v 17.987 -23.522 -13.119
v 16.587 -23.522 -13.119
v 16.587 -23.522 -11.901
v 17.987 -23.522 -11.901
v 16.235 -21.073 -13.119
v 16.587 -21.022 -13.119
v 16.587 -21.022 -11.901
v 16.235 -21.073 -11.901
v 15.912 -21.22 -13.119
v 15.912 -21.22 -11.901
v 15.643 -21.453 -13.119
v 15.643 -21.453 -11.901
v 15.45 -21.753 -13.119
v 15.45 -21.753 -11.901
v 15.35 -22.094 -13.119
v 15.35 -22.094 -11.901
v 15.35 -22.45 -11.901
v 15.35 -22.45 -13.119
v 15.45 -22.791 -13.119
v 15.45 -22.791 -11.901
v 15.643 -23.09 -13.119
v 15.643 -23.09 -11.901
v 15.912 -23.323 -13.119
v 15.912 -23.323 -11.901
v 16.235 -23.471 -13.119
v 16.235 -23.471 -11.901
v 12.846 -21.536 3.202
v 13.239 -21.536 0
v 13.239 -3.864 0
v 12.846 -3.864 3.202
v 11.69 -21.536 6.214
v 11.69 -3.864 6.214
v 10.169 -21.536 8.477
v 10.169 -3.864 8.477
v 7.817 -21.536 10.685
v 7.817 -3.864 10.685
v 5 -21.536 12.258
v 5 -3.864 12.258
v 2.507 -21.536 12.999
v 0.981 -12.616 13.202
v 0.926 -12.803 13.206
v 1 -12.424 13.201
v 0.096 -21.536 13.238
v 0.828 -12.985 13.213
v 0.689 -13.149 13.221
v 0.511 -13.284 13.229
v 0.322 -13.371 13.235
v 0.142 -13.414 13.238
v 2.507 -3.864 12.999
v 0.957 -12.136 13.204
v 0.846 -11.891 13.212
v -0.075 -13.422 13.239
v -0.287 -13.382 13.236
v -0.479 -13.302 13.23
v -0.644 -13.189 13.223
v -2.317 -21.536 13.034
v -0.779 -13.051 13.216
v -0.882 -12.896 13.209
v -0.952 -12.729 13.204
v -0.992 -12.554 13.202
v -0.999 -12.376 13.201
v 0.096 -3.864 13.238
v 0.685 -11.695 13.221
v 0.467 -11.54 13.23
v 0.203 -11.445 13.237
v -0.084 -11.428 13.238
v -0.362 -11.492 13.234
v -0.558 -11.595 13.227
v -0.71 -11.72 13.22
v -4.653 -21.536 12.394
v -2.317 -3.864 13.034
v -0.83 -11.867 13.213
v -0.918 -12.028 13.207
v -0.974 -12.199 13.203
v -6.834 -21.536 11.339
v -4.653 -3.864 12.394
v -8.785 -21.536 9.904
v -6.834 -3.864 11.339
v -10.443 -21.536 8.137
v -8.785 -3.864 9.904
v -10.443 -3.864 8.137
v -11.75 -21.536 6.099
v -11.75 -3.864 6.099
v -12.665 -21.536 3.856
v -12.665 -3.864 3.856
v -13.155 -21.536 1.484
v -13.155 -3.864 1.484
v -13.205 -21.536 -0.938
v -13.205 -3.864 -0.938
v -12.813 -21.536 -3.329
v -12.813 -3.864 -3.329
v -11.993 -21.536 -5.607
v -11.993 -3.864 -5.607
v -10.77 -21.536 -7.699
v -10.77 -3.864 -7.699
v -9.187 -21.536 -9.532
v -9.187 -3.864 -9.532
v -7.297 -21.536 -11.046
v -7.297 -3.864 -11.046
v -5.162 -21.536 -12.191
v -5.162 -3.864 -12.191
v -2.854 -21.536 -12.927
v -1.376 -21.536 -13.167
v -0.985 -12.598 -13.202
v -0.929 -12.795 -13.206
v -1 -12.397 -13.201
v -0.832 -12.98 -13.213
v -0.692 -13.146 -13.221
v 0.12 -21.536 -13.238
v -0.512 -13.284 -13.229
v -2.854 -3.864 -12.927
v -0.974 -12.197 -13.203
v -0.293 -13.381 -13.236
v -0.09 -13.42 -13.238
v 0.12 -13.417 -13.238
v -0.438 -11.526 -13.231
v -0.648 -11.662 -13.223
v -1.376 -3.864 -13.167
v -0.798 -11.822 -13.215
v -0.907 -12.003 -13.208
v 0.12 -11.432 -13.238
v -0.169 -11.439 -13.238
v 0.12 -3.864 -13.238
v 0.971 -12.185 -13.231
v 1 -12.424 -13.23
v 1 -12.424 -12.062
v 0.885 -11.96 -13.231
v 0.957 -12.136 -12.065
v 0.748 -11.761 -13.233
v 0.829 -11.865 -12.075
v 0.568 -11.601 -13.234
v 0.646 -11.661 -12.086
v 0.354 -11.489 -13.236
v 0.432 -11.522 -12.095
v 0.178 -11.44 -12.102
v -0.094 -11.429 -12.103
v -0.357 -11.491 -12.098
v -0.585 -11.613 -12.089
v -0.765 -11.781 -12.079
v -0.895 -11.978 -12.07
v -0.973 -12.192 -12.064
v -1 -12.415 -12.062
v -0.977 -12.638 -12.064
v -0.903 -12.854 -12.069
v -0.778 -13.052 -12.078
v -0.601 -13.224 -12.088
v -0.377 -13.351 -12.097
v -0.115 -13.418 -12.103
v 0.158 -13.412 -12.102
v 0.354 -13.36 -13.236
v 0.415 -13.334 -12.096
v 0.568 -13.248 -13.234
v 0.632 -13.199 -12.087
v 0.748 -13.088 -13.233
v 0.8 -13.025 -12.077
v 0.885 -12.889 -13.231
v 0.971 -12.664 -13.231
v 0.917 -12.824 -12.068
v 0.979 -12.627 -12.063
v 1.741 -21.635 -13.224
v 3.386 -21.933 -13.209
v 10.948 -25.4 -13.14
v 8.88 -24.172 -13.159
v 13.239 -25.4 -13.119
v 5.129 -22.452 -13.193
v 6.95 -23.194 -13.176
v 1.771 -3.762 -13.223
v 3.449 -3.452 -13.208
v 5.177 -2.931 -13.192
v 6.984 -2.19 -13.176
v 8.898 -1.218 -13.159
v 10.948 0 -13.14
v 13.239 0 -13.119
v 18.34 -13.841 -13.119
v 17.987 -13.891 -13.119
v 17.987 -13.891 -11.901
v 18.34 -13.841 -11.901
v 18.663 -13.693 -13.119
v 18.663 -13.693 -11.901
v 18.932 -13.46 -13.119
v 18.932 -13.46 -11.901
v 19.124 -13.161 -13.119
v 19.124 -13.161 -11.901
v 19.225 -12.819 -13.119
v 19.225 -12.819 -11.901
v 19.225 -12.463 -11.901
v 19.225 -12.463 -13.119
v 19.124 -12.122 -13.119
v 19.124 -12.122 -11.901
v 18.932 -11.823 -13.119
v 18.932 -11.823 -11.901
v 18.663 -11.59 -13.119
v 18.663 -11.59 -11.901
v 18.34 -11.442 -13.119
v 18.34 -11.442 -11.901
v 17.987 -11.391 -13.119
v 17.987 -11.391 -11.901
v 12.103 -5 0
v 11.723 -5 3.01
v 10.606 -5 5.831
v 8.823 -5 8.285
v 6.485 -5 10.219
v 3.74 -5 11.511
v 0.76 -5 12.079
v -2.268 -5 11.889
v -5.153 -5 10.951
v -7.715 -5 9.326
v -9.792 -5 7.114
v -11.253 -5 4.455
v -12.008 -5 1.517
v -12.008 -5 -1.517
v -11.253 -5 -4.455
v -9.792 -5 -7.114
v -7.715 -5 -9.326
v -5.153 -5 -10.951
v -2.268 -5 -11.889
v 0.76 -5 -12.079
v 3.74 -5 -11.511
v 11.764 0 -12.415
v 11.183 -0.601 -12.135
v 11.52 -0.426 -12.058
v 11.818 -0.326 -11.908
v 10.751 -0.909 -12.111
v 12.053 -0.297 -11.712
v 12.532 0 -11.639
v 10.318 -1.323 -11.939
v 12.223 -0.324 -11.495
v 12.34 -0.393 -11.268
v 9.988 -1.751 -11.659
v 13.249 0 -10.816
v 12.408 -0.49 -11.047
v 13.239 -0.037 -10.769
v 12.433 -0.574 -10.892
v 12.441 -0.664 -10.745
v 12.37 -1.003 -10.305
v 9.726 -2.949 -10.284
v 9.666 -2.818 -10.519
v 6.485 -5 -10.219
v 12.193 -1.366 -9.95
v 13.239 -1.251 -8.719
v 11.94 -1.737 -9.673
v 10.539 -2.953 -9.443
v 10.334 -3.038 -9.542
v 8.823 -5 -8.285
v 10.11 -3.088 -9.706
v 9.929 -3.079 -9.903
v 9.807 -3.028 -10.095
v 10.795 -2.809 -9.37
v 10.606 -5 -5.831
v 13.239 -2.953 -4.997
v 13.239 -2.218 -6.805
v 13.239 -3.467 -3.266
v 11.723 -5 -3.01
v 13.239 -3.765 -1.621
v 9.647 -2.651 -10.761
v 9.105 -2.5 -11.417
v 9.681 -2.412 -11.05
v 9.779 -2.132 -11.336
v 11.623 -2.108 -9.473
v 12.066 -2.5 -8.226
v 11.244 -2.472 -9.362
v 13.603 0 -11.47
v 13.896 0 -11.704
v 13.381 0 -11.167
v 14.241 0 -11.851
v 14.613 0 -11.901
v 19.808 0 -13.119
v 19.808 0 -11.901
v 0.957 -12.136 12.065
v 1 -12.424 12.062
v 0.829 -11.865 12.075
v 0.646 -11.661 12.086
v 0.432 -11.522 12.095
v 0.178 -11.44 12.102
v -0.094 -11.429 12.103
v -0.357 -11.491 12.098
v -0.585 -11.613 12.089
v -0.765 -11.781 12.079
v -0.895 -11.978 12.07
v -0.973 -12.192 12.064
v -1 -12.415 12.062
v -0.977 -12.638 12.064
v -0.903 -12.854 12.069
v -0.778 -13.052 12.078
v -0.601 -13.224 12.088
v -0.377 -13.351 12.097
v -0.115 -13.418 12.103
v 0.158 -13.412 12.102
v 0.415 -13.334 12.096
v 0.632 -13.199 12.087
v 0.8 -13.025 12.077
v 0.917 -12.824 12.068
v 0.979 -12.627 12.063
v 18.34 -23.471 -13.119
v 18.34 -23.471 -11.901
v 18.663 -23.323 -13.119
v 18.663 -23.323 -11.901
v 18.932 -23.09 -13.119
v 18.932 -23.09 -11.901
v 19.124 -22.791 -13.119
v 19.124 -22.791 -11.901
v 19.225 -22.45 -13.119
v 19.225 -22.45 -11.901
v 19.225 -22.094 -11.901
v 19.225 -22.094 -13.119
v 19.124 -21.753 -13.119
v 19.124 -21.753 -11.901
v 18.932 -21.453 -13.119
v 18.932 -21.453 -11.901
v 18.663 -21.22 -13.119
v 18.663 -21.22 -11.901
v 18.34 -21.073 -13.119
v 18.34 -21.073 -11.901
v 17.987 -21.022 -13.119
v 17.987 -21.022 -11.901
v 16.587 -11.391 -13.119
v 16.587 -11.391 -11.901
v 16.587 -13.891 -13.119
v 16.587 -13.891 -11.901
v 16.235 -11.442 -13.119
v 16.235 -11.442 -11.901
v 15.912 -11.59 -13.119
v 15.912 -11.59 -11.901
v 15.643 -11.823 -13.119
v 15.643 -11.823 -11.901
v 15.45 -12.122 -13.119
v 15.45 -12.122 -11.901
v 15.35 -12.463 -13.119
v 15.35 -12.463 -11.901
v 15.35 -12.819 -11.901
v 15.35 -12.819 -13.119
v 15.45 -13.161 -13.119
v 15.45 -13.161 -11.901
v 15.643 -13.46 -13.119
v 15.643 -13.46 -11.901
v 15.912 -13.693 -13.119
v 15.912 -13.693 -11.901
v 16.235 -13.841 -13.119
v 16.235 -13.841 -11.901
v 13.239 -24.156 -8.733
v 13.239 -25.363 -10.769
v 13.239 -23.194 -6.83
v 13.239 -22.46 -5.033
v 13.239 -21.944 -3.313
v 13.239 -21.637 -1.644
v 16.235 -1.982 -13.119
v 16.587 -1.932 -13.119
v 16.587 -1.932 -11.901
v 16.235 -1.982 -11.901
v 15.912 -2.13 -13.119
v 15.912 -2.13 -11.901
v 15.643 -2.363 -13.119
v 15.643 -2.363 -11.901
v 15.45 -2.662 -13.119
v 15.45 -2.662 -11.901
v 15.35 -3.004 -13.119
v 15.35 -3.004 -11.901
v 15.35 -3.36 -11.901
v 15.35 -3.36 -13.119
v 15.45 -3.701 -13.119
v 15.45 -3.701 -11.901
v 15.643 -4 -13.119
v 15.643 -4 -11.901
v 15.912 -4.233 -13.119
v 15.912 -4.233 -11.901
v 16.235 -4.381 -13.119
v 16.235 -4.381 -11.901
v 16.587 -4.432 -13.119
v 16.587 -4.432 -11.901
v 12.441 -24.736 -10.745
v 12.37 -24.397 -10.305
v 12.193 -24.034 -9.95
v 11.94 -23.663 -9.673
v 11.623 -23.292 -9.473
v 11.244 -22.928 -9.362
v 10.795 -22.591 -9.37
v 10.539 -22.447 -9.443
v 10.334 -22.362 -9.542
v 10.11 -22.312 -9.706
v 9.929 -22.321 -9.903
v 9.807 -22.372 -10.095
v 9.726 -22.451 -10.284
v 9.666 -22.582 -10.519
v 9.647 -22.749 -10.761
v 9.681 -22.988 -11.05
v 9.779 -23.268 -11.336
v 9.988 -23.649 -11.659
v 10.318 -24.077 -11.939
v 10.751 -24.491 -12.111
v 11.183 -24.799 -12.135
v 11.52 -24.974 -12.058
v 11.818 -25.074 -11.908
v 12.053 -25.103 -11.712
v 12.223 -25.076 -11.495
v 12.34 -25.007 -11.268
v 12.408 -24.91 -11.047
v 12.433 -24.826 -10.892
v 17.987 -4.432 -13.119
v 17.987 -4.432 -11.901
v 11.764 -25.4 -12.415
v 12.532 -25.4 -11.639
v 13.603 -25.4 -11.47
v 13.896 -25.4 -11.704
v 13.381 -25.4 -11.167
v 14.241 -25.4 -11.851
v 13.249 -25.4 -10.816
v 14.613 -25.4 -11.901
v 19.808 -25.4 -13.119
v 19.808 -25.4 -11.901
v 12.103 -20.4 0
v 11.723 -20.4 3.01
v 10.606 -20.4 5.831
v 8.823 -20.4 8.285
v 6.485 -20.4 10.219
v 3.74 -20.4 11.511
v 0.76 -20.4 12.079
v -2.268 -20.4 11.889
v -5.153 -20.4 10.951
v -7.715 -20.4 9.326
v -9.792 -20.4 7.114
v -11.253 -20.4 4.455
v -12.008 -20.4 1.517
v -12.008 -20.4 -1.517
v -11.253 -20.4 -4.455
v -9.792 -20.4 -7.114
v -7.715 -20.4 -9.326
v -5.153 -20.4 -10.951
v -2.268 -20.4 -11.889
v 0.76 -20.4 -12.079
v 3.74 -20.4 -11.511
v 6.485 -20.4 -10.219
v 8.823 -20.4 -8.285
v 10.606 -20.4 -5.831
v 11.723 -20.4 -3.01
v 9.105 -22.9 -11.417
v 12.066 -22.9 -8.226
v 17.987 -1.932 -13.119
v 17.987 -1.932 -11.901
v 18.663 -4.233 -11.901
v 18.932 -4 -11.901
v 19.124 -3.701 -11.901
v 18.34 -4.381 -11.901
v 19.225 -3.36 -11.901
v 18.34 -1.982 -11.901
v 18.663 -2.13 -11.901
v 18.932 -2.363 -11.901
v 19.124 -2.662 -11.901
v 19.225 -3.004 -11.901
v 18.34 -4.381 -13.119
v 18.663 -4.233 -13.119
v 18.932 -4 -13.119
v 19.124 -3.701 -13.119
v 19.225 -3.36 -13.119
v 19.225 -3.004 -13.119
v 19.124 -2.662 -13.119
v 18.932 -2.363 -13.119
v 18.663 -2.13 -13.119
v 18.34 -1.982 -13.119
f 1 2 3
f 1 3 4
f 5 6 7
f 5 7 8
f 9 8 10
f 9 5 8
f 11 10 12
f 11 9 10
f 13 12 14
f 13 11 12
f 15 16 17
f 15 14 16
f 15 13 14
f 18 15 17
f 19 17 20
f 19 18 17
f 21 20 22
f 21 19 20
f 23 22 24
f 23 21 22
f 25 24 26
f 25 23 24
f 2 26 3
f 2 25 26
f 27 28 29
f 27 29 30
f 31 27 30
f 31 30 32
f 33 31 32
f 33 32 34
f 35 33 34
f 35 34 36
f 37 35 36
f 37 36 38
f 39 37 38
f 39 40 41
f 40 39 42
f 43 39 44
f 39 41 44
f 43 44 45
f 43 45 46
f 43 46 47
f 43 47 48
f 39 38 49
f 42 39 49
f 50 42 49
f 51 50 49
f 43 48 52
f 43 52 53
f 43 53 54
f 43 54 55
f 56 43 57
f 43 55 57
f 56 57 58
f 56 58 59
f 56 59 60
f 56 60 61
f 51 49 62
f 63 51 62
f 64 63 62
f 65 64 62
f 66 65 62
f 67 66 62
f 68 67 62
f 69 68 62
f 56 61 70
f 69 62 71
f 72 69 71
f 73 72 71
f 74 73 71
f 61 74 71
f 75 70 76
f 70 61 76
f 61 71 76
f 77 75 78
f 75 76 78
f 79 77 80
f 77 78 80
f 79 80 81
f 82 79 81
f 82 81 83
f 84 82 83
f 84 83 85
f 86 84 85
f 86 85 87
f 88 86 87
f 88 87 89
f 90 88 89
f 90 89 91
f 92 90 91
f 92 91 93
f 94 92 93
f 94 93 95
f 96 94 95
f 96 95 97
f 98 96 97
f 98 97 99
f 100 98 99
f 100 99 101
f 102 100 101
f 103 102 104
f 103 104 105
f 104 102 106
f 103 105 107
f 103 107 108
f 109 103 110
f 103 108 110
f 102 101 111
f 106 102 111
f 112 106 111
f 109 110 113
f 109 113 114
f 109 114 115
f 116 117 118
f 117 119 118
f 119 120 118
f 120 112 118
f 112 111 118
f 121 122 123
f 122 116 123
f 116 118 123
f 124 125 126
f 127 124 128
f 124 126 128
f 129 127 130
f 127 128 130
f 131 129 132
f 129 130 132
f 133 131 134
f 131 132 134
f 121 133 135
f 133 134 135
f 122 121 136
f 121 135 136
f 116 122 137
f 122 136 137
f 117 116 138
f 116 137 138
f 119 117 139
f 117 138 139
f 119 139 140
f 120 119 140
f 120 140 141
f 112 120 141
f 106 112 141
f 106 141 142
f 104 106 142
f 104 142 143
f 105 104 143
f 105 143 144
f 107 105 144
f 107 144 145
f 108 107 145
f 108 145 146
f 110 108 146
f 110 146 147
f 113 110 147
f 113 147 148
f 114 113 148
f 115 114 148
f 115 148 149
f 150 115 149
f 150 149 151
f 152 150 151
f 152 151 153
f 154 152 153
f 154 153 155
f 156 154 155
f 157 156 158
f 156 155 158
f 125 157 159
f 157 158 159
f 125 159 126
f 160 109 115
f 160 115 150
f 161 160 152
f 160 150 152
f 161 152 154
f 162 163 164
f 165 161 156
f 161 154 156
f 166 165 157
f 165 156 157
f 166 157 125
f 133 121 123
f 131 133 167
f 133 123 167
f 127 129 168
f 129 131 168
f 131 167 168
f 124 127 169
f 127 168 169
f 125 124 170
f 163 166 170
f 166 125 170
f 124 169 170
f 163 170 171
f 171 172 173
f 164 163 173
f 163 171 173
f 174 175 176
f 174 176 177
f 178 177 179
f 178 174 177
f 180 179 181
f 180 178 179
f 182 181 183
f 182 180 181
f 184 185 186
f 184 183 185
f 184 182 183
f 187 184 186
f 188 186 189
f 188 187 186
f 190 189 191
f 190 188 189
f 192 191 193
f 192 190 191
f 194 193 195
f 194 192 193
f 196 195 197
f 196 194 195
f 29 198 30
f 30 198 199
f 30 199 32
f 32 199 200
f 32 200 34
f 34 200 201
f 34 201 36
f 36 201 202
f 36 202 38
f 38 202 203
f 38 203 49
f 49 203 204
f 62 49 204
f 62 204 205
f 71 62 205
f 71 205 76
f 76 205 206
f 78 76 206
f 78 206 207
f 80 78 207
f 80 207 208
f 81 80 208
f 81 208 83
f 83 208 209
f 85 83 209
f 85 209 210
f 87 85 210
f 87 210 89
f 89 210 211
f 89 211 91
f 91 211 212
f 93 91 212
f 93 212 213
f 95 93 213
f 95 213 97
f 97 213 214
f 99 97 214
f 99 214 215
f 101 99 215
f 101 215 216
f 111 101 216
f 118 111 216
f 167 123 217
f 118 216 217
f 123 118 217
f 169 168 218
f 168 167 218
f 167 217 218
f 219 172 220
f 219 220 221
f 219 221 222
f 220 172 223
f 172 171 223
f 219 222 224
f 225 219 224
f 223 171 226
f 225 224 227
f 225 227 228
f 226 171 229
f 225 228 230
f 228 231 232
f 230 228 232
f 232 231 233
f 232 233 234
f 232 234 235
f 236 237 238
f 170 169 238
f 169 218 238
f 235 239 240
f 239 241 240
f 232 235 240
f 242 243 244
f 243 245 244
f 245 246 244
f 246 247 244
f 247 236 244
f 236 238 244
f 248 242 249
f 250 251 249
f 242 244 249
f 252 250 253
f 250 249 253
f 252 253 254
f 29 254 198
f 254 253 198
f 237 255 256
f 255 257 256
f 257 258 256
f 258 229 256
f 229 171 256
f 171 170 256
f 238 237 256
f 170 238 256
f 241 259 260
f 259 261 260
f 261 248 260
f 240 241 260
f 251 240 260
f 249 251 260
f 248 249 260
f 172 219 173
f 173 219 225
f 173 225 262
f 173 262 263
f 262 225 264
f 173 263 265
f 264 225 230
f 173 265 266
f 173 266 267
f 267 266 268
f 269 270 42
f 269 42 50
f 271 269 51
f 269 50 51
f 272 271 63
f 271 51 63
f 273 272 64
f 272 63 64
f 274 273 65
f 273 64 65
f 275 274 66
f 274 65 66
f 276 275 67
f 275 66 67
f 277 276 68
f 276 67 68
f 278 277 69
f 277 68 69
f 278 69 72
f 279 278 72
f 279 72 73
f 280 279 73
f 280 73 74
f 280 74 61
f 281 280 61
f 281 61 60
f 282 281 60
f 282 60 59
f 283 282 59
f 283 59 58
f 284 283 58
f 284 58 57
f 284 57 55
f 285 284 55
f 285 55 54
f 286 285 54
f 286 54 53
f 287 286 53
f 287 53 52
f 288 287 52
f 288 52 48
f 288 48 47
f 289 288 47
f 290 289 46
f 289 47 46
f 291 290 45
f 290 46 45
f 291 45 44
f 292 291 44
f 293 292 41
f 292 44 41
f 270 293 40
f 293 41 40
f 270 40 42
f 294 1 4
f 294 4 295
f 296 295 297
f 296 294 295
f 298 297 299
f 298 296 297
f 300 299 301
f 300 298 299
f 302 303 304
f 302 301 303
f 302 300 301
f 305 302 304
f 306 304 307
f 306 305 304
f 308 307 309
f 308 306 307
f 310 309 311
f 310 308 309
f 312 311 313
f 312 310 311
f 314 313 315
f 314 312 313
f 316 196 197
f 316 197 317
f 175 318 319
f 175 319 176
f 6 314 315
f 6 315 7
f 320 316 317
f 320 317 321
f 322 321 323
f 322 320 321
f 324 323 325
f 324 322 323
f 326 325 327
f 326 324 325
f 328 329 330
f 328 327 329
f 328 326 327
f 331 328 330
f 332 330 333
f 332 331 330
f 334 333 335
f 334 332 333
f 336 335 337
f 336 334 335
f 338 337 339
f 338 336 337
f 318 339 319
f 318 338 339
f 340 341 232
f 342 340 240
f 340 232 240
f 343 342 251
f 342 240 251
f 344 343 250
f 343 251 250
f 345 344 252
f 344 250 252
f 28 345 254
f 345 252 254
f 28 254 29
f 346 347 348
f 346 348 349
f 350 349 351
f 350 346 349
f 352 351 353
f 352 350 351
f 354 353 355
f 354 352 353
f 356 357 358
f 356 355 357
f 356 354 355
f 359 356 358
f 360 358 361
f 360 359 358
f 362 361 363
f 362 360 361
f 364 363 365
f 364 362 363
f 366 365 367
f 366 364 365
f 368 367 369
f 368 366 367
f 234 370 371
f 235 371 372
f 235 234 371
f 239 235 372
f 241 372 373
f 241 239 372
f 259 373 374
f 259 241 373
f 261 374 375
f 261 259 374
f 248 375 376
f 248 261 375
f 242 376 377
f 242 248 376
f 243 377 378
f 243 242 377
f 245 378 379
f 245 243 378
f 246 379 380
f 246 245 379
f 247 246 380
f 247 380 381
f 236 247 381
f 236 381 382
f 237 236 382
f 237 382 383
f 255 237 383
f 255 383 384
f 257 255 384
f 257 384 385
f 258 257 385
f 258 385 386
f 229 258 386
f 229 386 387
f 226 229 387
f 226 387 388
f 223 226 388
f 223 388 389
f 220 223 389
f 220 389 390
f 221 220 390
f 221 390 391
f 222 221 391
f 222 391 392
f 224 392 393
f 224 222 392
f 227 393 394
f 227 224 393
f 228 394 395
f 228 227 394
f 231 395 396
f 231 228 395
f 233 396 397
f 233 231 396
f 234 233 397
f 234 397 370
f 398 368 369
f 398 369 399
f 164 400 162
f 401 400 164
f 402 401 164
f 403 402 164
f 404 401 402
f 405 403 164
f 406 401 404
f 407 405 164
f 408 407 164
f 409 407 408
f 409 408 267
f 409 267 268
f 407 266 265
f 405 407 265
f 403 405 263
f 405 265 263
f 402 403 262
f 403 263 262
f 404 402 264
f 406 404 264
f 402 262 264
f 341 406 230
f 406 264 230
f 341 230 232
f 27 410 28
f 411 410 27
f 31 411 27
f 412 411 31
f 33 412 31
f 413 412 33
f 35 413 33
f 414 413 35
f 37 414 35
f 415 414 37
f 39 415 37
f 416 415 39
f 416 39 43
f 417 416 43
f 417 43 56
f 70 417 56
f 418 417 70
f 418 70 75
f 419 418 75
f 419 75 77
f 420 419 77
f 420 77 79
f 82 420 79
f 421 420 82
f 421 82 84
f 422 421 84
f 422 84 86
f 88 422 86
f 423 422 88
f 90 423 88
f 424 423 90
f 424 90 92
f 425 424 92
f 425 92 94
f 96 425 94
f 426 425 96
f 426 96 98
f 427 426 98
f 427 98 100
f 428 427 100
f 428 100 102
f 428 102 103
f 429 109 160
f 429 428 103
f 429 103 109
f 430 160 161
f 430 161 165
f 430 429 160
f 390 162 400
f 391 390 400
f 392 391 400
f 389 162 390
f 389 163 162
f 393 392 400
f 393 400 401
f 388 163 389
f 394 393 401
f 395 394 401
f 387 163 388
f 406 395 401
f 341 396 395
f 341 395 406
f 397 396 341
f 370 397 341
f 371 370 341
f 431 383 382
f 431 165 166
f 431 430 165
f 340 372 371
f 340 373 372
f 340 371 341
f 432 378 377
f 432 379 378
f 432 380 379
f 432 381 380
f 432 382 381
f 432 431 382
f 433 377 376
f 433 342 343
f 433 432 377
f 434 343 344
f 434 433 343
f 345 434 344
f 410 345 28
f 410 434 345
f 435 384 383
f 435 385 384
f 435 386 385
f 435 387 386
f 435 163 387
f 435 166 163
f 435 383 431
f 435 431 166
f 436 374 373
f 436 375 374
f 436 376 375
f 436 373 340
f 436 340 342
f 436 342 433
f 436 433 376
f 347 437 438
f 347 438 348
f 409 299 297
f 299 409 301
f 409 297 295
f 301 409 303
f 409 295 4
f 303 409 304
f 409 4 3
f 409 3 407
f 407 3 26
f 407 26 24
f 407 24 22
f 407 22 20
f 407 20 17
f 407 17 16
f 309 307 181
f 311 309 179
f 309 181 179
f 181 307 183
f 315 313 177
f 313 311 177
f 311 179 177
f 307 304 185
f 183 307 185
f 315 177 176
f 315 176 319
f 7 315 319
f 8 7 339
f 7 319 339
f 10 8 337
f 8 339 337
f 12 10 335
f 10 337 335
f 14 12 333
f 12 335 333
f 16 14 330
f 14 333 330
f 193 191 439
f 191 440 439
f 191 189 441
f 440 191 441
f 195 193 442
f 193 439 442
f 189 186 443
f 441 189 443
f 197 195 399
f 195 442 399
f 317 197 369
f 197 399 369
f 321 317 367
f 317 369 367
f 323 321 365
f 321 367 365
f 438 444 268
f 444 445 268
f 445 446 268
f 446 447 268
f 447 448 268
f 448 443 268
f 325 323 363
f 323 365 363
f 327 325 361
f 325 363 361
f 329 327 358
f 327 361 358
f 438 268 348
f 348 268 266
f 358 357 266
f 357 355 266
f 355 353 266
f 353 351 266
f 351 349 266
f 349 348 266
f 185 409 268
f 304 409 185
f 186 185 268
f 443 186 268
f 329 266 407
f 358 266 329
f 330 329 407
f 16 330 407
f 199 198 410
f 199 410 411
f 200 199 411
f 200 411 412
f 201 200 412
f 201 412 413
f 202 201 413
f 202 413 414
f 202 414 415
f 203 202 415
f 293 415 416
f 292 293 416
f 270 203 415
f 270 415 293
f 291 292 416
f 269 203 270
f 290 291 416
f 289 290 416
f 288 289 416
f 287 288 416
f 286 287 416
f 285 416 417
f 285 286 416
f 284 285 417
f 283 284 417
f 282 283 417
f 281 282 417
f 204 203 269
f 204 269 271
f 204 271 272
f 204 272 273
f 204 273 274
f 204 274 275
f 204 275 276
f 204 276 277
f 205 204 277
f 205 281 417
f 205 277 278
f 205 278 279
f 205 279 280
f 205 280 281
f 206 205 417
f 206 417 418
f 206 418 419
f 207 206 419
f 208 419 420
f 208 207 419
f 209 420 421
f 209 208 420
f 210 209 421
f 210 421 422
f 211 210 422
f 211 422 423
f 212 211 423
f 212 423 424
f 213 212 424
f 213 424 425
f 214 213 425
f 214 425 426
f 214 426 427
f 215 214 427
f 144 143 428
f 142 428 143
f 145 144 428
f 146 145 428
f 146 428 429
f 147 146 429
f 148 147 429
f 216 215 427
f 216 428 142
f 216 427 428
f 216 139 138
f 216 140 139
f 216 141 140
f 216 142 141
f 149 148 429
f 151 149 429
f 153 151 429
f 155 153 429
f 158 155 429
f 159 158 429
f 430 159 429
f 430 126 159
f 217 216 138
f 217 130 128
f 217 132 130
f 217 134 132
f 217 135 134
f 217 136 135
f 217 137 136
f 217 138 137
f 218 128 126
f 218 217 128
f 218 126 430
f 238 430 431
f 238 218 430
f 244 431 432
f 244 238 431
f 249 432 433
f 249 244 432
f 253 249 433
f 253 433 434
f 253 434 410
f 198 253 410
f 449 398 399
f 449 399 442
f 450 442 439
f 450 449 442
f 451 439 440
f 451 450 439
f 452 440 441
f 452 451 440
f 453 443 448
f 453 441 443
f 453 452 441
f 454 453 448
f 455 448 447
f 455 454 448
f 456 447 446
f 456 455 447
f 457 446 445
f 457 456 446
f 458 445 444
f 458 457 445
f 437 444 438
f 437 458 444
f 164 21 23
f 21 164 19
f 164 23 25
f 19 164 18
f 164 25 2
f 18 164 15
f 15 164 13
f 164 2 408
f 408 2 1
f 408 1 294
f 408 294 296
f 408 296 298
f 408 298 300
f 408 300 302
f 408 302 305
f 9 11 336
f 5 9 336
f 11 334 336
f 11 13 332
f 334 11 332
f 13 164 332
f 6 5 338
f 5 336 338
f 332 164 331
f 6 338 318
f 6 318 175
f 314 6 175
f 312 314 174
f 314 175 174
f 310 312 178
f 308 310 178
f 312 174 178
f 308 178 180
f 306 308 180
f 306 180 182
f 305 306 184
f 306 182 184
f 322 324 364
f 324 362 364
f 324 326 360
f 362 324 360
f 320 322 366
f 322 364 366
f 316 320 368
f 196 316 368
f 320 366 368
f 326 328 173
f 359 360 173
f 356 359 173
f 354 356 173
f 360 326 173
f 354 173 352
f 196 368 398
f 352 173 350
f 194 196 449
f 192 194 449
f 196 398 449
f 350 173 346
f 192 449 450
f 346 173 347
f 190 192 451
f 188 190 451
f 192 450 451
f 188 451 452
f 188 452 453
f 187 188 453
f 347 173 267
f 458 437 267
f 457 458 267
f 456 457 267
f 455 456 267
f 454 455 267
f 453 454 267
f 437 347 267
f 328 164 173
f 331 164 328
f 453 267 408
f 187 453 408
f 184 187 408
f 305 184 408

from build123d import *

# Parameters (mm, degrees)
F0_R     = 12.1031
F0_R_2   = 1.397
F1_DEPTH = 25.4
F4_DEPTH = 1.7
F8_R     = 1
F9_DEPTH = 27.8


# Not quite as in the source:
# - a fillet or chamfer that OpenCascade refuses, or shapes differently, is made with other operations: its cross-section is extruded or revolved along the edge and cut away or added


with BuildPart() as f1:
    # F0 (on Front) → F1 (new body)
    with BuildSketch(Plane.XZ):
        with BuildLine():
            ThreePointArc((0.1198459876, -13.2382072509), (9.403486197, -9.3187414184), (13.2387497249, 0))
            ThreePointArc((13.2387497249, 0), (-9.403486197, 9.3187414184), (0.1198459876, -13.2382072509))
        make_face()
        Circle(F0_R, mode=Mode.SUBTRACT)
        with BuildLine():
            Line((13.2387497249, -10.7690971345), (13.2387497249, 0))
            ThreePointArc((13.2387497249, 0), (9.403486197, -9.3187414184), (0.1198459876, -13.2382072509))
            Line((0.1198459876, -13.2382072509), (13.2387497249, -13.1194414571))
            Line((13.2387497249, -13.1194414571), (13.2387497249, -10.7690971345))
        make_face()
        with Locations((11.0441939905, -10.7448566705)):
            Circle(F0_R_2, mode=Mode.SUBTRACT)
        with BuildLine():
            ThreePointArc((14.6132539958, -11.9012827054), (13.7228739986, -11.5817927037), (13.2387497249, -10.7690971345))
            Line((13.2387497249, -10.7690971345), (13.2387497249, -13.1194414571))
            Line((13.2387497249, -13.1194414571), (19.8077764362, -13.1194414571))
            Line((19.8077764362, -13.1194414571), (19.8077764362, -11.9012827054))
            Line((19.8077764362, -11.9012827054), (14.6132539958, -11.9012827054))
        make_face()
    extrude(amount=F1_DEPTH)

    # F3 (on offset) → F4 (cut)
    with BuildSketch(Plane.XY.offset(-13.208)):
        with BuildLine():
            Line((16.5873928428, -4.4316952396), (17.9873928428, -4.4316952396))
            ThreePointArc((17.9873928428, -4.4316952396), (19.2373928428, -3.1816952396), (17.9873928428, -1.9316952396))
            Line((17.9873928428, -1.9316952396), (16.5873928428, -1.9316952396))
            ThreePointArc((16.5873928428, -1.9316952396), (15.3373928428, -3.1816952396), (16.5873928428, -4.4316952396))
        make_face()
        with BuildLine():
            Line((16.5873928428, -13.8912473619), (17.9873928428, -13.8912473619))
            ThreePointArc((17.9873928428, -13.8912473619), (19.2373928428, -12.6412473619), (17.9873928428, -11.3912473619))
            Line((17.9873928428, -11.3912473619), (16.5873928428, -11.3912473619))
            ThreePointArc((16.5873928428, -11.3912473619), (15.3373928428, -12.6412473619), (16.5873928428, -13.8912473619))
        make_face()
        with BuildLine():
            Line((16.5873928428, -23.5218666773), (17.9873928428, -23.5218666773))
            ThreePointArc((17.9873928428, -23.5218666773), (19.2373928428, -22.2718666773), (17.9873928428, -21.0218666773))
            Line((17.9873928428, -21.0218666773), (16.5873928428, -21.0218666773))
            ThreePointArc((16.5873928428, -21.0218666773), (15.3373928428, -22.2718666773), (16.5873928428, -23.5218666773))
        make_face()
    extrude(amount=F4_DEPTH, mode=Mode.SUBTRACT)

    # F5: chamfer of 5 on 1 edges, made by hand

    # F5_s1 → F5_t2 (revolve, cut)
    with BuildSketch(Plane.XY):
        Polygon((17.1031, -25.4), (12.1031, -20.4), (12.1031, -25.4), align=None)
    revolve(axis=Axis((0, -25.4, 0), (0, -1, 0)), mode=Mode.SUBTRACT)

    # F6: chamfer of 5 on 1 edges, made by hand

    # F6_s1 → F6_t2 (revolve, cut)
    with BuildSketch(Plane.XY):
        Polygon((17.1031, 0), (12.1031, -5), (12.1031, 0), align=None)
    revolve(axis=Axis((0, 0, 0), (0, -1, 0)), mode=Mode.SUBTRACT)

    # F8 (on offset) → F9 (cut)
    with BuildSketch(Plane.XY.offset(13.492)):
        with Locations((0, -12.424448505)):
            Circle(F8_R)
    extrude(amount=-F9_DEPTH, mode=Mode.SUBTRACT)


solid = f1.part
